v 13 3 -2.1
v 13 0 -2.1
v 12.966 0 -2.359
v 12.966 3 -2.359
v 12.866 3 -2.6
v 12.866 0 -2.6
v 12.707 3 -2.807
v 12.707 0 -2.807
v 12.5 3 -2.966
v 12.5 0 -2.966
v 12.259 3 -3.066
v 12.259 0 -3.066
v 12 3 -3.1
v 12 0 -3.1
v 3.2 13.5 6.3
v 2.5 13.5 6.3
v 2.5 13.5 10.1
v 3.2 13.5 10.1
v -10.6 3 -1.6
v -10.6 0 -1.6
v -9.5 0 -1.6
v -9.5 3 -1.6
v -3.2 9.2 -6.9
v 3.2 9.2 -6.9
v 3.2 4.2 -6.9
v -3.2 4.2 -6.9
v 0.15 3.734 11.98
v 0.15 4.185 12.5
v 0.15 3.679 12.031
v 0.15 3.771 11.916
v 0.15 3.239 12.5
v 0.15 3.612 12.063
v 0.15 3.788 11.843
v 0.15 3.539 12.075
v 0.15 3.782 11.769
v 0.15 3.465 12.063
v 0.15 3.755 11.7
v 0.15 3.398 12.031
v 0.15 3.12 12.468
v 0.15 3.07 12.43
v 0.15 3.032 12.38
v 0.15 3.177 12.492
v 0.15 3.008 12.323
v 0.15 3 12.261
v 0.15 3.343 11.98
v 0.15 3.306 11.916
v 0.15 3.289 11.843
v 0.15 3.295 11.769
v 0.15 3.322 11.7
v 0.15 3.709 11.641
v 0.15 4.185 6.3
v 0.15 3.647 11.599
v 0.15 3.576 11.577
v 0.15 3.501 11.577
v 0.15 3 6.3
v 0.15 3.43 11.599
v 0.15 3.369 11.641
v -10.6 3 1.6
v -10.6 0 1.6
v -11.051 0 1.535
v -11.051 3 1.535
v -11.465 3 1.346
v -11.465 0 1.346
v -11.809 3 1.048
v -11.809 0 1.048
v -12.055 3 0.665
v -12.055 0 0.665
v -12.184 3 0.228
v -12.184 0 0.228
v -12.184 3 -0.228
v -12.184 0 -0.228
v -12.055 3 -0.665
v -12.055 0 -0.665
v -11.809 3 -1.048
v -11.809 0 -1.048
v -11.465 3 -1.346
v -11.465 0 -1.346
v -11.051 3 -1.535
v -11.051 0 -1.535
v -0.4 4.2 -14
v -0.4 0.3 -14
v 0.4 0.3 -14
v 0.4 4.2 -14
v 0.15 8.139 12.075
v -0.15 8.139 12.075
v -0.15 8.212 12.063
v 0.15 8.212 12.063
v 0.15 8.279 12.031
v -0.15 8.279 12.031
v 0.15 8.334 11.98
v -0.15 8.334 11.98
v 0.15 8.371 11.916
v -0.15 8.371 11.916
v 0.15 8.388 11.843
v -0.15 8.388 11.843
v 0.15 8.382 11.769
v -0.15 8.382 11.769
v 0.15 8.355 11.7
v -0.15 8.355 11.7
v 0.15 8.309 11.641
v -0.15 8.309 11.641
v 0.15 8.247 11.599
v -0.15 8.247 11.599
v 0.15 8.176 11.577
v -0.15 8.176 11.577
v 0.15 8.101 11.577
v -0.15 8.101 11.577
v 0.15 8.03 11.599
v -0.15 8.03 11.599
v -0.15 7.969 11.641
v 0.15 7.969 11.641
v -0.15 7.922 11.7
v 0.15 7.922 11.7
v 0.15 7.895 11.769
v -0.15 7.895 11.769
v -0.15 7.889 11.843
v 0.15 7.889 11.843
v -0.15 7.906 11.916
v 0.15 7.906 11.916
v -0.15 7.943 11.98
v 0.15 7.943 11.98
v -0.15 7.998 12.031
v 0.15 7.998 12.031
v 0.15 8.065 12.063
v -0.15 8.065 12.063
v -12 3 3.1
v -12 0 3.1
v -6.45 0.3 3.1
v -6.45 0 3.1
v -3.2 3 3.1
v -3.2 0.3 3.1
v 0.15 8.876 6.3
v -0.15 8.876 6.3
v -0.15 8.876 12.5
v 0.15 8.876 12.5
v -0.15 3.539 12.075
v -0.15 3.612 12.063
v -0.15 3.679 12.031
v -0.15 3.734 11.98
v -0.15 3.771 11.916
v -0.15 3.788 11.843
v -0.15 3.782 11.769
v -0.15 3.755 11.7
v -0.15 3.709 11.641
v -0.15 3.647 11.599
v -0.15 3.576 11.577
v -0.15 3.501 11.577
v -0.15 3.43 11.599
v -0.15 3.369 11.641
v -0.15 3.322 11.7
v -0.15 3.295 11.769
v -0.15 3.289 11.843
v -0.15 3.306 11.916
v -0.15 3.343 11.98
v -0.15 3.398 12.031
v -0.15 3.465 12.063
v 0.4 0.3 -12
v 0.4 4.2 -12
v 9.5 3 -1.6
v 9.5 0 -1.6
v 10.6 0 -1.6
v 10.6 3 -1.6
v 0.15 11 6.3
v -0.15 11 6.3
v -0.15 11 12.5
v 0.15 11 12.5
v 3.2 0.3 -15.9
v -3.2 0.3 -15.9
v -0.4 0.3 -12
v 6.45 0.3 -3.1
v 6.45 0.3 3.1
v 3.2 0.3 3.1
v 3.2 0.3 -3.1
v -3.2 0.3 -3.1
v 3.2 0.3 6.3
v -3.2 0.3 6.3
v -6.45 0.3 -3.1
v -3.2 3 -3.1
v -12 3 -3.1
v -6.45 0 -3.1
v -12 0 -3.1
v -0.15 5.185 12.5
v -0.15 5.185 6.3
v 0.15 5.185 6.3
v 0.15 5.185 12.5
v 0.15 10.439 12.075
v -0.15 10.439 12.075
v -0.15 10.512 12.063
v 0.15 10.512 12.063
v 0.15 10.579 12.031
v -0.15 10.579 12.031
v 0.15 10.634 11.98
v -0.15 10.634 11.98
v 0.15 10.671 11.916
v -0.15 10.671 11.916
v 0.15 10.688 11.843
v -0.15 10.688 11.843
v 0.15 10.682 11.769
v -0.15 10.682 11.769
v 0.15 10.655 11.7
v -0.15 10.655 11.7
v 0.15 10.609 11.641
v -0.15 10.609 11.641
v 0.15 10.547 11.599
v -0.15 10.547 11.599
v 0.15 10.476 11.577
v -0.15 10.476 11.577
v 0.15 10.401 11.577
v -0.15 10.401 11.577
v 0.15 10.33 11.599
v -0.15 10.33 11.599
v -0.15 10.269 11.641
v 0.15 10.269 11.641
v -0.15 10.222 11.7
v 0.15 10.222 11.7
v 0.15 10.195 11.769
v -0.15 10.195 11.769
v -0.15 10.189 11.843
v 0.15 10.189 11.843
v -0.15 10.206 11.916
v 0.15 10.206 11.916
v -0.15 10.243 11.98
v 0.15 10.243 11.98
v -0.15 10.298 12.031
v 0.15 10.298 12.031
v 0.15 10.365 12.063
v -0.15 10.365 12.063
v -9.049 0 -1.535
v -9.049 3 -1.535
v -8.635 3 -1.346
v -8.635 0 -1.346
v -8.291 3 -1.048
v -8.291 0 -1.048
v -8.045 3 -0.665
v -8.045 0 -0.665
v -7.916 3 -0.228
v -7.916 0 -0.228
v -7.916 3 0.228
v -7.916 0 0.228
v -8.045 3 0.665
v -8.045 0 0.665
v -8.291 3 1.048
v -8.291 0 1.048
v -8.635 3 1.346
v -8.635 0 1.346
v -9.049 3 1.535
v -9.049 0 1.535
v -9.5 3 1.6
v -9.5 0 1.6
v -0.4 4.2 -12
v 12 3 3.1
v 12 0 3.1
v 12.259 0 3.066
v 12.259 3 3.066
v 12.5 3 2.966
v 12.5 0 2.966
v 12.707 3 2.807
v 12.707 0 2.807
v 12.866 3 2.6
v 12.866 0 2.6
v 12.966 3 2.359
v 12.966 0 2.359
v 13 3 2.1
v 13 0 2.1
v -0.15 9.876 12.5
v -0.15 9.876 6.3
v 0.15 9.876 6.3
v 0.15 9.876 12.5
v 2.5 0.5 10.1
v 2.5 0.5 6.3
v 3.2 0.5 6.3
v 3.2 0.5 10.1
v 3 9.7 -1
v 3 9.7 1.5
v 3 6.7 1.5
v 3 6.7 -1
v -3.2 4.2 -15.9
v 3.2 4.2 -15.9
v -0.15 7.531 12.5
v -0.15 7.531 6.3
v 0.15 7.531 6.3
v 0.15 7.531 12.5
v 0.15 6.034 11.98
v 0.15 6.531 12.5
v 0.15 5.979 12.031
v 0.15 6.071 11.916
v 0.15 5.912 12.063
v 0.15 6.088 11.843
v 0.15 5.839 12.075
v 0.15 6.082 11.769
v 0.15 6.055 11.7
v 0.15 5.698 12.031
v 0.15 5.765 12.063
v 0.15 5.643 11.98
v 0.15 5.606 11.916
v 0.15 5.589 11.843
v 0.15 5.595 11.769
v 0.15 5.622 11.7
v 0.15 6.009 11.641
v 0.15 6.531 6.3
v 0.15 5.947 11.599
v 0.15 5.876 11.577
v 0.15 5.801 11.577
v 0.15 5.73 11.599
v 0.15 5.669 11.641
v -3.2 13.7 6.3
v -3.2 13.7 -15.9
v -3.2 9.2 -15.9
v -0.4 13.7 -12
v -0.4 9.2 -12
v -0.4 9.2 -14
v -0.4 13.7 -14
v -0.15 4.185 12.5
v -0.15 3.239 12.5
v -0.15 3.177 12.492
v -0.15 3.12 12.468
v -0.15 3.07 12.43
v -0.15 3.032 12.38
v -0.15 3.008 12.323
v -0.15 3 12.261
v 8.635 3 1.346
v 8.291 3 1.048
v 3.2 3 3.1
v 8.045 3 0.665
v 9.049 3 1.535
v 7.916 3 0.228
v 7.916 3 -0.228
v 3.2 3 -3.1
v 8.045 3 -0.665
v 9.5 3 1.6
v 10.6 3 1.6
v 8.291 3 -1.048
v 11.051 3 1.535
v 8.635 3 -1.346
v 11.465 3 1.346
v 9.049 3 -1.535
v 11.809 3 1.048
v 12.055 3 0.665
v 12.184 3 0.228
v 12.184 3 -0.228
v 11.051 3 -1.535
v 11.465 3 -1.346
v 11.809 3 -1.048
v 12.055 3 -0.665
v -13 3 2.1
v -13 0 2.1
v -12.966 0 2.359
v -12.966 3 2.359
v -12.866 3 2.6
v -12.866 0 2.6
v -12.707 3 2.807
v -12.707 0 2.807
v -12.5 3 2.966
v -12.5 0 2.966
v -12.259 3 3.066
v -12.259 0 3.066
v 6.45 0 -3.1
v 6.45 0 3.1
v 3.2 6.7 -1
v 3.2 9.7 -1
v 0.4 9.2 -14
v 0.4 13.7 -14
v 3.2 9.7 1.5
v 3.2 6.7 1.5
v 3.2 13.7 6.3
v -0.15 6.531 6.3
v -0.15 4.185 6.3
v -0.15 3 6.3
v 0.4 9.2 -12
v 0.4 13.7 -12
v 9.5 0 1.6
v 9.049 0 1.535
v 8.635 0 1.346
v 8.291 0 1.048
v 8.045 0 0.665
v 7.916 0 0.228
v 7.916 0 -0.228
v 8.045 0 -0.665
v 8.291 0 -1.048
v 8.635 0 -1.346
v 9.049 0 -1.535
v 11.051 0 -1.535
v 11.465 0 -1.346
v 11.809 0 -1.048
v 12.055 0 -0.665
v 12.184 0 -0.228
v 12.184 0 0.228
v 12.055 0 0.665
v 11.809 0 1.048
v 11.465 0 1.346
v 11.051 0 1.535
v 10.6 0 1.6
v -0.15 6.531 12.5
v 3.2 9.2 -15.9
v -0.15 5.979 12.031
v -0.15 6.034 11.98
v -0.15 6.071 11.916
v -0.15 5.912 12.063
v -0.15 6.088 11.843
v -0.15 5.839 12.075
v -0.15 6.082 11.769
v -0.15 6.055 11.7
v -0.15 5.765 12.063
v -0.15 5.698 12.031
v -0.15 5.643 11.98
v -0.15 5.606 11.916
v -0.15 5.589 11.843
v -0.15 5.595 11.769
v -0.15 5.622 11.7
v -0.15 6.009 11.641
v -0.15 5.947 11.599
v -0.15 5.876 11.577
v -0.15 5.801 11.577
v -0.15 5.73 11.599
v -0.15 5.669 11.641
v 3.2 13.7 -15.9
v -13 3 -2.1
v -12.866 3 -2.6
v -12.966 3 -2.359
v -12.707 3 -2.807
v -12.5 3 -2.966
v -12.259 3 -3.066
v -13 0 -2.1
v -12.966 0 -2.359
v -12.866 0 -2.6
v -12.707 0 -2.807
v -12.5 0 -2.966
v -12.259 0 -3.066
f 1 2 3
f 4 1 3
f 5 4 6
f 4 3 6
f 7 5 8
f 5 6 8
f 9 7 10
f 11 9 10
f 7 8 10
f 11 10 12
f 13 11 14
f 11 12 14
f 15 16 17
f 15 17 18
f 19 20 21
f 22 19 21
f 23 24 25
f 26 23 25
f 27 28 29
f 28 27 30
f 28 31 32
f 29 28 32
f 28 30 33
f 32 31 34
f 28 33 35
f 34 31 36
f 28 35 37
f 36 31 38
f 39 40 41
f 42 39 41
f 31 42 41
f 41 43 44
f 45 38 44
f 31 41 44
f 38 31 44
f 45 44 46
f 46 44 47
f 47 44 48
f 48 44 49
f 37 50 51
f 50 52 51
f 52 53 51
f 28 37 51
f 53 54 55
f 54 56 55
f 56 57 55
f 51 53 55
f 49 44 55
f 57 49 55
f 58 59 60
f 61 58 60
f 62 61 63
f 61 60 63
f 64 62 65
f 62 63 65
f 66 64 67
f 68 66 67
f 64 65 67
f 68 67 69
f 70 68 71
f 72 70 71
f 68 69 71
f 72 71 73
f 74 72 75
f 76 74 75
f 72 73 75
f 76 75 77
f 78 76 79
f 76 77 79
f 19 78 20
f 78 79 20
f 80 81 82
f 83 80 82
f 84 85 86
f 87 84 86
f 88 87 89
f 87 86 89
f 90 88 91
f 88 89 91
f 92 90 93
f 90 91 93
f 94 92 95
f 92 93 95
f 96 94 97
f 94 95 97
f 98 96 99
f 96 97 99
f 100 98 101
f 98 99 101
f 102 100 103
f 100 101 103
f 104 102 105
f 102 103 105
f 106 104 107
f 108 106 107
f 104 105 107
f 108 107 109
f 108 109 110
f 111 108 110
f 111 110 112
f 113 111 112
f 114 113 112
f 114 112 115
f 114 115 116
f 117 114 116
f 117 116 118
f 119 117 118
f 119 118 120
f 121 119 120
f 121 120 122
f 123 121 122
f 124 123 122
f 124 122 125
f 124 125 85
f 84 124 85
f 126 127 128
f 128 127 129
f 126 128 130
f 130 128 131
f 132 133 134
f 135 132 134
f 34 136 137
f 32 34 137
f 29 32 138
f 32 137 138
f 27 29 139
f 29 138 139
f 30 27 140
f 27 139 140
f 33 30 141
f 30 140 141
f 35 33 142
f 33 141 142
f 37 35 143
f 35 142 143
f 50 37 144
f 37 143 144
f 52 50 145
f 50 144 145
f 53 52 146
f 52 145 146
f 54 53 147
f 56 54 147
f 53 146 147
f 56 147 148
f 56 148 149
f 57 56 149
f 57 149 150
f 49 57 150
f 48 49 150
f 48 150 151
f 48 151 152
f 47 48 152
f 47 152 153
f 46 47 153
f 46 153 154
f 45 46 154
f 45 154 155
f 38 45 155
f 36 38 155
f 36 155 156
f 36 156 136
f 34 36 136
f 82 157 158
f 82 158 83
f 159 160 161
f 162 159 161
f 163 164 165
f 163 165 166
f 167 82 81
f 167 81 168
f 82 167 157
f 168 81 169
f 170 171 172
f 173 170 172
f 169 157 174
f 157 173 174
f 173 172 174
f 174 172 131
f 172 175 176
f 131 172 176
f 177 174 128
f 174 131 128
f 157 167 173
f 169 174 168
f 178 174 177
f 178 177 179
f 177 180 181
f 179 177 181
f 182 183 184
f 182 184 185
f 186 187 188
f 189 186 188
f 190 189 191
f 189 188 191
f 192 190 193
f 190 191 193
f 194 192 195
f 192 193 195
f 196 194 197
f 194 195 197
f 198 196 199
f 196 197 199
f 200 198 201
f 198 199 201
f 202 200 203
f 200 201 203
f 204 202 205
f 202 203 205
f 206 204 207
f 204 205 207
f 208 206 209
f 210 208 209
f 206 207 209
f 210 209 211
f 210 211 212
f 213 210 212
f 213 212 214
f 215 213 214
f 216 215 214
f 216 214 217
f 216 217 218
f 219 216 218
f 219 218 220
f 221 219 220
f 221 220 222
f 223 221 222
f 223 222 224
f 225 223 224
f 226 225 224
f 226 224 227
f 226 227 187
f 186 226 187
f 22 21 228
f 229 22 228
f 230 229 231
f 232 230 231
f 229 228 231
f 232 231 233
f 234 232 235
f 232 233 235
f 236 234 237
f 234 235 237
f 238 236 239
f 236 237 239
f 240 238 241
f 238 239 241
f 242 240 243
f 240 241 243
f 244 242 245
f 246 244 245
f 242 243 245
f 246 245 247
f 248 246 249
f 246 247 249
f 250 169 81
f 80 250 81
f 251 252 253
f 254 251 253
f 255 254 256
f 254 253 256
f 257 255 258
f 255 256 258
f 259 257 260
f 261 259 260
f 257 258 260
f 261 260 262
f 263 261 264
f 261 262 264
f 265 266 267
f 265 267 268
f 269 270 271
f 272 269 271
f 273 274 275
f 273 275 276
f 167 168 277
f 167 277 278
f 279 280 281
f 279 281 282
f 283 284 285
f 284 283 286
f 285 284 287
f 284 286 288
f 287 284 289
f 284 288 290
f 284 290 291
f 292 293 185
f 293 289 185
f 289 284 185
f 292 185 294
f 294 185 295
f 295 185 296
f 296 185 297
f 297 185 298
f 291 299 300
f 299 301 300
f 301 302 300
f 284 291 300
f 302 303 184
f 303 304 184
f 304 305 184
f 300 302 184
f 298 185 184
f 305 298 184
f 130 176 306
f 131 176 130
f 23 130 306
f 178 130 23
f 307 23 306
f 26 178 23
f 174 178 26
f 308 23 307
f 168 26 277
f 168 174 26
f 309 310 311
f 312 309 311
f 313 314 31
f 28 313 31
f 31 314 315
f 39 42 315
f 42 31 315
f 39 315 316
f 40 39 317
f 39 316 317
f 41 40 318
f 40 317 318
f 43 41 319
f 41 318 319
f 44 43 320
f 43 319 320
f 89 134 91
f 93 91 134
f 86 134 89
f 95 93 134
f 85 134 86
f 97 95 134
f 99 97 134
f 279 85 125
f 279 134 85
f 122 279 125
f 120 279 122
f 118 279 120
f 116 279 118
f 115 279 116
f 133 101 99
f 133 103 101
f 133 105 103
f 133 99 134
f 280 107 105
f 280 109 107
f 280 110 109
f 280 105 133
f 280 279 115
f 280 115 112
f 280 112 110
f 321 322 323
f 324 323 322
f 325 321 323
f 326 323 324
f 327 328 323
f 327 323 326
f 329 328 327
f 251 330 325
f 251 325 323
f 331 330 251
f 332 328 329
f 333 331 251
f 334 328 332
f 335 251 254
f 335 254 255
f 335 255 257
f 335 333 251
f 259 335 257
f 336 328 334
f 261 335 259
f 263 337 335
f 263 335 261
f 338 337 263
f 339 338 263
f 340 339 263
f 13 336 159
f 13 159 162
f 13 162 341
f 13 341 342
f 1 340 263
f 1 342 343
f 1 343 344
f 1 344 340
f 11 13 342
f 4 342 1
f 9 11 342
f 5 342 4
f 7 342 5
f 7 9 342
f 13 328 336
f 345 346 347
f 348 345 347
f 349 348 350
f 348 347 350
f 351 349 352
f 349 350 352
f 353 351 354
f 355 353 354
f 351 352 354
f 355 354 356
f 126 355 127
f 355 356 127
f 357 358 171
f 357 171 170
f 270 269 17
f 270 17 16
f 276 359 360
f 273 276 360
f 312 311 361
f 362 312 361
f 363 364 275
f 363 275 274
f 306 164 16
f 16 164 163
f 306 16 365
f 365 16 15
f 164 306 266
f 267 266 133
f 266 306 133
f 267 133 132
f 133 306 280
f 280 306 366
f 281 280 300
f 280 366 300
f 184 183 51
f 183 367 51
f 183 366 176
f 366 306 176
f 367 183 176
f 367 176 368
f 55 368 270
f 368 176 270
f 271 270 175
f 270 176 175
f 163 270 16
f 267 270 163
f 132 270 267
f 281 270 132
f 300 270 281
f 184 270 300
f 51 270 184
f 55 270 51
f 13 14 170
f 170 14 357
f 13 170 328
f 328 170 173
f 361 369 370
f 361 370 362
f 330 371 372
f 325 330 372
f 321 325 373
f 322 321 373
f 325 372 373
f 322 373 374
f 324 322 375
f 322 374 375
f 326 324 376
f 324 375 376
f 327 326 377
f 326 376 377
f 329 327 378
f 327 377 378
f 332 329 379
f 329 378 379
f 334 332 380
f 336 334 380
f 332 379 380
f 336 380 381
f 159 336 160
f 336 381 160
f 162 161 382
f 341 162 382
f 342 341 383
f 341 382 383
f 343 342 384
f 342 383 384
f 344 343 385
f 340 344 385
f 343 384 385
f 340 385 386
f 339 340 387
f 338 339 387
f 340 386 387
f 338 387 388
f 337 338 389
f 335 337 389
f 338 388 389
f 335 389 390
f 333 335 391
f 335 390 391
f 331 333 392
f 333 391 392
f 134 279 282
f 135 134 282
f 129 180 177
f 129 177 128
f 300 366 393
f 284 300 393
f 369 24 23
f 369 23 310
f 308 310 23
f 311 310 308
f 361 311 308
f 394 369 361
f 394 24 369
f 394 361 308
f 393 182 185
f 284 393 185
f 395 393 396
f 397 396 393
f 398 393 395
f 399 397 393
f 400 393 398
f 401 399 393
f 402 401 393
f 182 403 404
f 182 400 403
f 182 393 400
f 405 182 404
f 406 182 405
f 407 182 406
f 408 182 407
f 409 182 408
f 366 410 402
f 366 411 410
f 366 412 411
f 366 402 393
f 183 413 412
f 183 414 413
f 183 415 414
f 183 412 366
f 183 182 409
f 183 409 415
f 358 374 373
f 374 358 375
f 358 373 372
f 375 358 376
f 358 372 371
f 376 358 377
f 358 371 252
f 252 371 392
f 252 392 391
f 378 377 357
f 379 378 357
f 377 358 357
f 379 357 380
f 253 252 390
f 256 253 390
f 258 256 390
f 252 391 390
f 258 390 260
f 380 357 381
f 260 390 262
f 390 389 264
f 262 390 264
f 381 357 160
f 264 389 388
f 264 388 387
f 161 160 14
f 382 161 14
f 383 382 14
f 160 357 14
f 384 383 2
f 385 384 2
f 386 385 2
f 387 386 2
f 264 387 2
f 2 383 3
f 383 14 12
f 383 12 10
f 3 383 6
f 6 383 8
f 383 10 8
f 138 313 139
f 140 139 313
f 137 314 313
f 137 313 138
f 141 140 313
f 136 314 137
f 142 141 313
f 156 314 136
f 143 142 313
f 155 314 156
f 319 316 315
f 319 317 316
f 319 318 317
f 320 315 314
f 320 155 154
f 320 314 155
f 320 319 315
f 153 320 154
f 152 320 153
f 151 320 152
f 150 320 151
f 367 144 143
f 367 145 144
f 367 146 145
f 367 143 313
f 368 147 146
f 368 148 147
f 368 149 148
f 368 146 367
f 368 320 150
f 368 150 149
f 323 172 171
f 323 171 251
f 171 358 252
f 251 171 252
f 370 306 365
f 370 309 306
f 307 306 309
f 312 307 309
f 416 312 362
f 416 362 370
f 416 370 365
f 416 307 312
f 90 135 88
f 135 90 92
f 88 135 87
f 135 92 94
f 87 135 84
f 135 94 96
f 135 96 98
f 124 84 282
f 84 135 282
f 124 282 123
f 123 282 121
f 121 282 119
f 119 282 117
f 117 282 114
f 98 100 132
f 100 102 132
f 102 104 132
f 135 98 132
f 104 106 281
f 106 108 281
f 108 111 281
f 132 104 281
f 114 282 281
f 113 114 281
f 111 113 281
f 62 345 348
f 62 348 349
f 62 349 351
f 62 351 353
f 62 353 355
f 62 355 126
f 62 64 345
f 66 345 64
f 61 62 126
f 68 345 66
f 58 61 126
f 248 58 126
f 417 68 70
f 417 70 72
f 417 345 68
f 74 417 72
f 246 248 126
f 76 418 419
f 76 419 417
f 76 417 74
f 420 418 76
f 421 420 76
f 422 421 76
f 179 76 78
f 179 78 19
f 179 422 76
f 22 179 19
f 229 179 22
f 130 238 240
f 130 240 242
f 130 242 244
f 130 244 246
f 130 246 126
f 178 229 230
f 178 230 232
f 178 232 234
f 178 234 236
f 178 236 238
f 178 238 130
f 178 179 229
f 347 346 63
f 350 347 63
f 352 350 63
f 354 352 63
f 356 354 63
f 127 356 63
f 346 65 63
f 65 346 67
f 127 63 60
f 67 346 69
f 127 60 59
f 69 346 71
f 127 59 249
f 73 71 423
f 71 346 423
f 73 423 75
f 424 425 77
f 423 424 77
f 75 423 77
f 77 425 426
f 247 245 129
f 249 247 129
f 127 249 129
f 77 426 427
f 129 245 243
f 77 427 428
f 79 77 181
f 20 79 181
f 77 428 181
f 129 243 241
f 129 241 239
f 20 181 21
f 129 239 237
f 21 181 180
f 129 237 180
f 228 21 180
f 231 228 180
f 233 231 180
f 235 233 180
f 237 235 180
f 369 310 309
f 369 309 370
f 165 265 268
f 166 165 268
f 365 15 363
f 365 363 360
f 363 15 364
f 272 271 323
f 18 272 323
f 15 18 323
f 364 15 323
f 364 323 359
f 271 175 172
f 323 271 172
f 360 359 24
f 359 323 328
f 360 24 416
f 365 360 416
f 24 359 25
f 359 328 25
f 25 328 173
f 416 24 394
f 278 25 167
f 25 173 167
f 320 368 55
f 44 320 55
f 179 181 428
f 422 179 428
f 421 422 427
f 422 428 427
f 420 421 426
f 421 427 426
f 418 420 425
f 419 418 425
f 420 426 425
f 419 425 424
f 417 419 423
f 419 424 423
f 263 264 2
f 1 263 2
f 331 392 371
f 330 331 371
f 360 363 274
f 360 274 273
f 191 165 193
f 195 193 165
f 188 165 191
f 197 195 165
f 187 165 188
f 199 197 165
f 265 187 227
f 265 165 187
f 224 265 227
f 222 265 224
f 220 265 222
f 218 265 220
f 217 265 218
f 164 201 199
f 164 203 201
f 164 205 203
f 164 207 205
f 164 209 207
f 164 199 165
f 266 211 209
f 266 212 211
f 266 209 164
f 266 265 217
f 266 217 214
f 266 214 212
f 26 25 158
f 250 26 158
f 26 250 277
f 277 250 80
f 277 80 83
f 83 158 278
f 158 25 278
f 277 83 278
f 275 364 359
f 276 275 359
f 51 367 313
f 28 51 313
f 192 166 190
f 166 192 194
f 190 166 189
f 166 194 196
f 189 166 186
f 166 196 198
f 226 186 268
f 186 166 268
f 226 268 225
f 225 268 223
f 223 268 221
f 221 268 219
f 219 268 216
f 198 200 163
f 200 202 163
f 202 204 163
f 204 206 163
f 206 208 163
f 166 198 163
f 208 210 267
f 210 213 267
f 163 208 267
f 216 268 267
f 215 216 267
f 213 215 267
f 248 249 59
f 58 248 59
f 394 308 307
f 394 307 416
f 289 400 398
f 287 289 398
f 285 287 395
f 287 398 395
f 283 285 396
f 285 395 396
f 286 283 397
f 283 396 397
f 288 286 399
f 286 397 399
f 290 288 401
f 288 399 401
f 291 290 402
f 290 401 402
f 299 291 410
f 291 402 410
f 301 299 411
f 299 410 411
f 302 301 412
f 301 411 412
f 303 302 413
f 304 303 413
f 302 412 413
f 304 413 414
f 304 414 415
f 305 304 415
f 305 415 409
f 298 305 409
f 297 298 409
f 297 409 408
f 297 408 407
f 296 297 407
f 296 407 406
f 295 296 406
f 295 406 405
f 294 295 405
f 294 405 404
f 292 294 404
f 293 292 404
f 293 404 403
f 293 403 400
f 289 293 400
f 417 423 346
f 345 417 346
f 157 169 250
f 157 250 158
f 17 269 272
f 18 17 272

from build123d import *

# Parameters (mm, degrees)
SKETCH1_W                = 6.4
SKETCH1_H                = 22.2
SKETCH1_W_2              = 0.8
SKETCH1_H_2              = 2
BOSS_EXTRUDE1_DEPTH      = 13.7
BOSS_EXTRUDE2_DEPTH      = 3
SKETCH2_W                = 9
SKETCH2_H                = 5
CUT_EXTRUDE1_DEPTH       = 27.513015672
SKETCH2_3_W              = 2.5
SKETCH2_3_H              = 3
CUT_EXTRUDE2_DEPTH       = 0.2
CUT_EXTRUDE3_DEPTH       = 0.3
BOSS_EXTRUDE3_DEPTH      = 6.5
BOSS_EXTRUDE3_DEPTH_BACK = 6.5
SKETCH4_W                = 0.7
SKETCH4_H                = 3.8
BOSS_EXTRUDE4_DEPTH      = 4
BOSS_EXTRUDE4_DEPTH_BACK = 4
SKETCH4_3_W              = 0.3
SKETCH4_3_H              = 6.2
SKETCH7_R                = 0.25
SKETCH7_W                = 6.2
SKETCH7_H                = 1
CUT_EXTRUDE4_DEPTH       = 1


with BuildPart() as part:
    # Sketch1 → Boss-Extrude1 (new body)
    with BuildSketch(Plane(origin=(0, 0, 0), x_dir=(1, 0, 0), z_dir=(0, 1, 0))):
        with Locations((0, 4.8)):
            Rectangle(SKETCH1_W, SKETCH1_H)
        with Locations((0, 13)):
            Rectangle(SKETCH1_W_2, SKETCH1_H_2, mode=Mode.SUBTRACT)
    extrude(amount=BOSS_EXTRUDE1_DEPTH)

    # Sketch1<4> → Boss-Extrude2 (add)
    # profile 1 of 2: a face of its own
    with BuildSketch(Plane(origin=(0, 0, 0), x_dir=(1, 0, 0), z_dir=(0, 1, 0))):
        with BuildLine():
            Line((-3.2, -3.1), (-3.2, 3.1))
            Line((-3.2, 3.1), (-12, 3.1))
            ThreePointArc((-12, 3.1), (-12.707106781, 2.807106781), (-13, 2.1))
            Line((-13, 2.1), (-13, -2.1))
            ThreePointArc((-13, -2.1), (-12.707106781, -2.807106781), (-12, -3.1))
            Line((-12, -3.1), (-3.2, -3.1))
        make_face()
        with BuildLine():
            ThreePointArc((-10.6, -1.6), (-12.2, 0), (-10.6, 1.6))
            Line((-10.6, 1.6), (-9.5, 1.6))
            ThreePointArc((-9.5, 1.6), (-7.9, 0), (-9.5, -1.6))
            Line((-9.5, -1.6), (-10.6, -1.6))
        make_face(mode=Mode.SUBTRACT)
    # profile 2 of 2: a face of its own
    with BuildSketch(Plane(origin=(0, 0, 0), x_dir=(1, 0, 0), z_dir=(0, 1, 0))):
        with BuildLine():
            Line((12, 3.1), (3.2, 3.1))
            Line((3.2, 3.1), (3.2, -3.1))
            Line((3.2, -3.1), (12, -3.1))
            ThreePointArc((12, -3.1), (12.707106781, -2.807106781), (13, -2.1))
            Line((13, -2.1), (13, 2.1))
            ThreePointArc((13, 2.1), (12.707106781, 2.807106781), (12, 3.1))
        make_face()
        with BuildLine():
            Line((9.5, 1.6), (10.6, 1.6))
            ThreePointArc((10.6, 1.6), (12.2, 0), (10.6, -1.6))
            Line((10.6, -1.6), (9.5, -1.6))
            ThreePointArc((9.5, -1.6), (7.9, 0), (9.5, 1.6))
        make_face(mode=Mode.SUBTRACT)
    extrude(amount=BOSS_EXTRUDE2_DEPTH)

    # Sketch2 → Cut-Extrude1 (cut, through all)
    with BuildSketch(Plane(origin=(3.2, 0, 0), x_dir=(0, 0, -1), z_dir=(1, 0, 0))):
        with Locations((11.4, 6.7)):
            Rectangle(SKETCH2_W, SKETCH2_H)
    extrude(amount=-CUT_EXTRUDE1_DEPTH, mode=Mode.SUBTRACT)

    # Sketch2<3> → Cut-Extrude2 (cut)
    with BuildSketch(Plane(origin=(3.2, 0, 0), x_dir=(0, 0, -1), z_dir=(1, 0, 0))):
        with Locations((-0.25, 8.2)):
            Rectangle(SKETCH2_3_W, SKETCH2_3_H)
    extrude(amount=-CUT_EXTRUDE2_DEPTH, mode=Mode.SUBTRACT)

    # Sketch3 → Cut-Extrude3 (cut)
    with BuildSketch(Plane.XZ):
        Polygon((-6.45, 3.1), (-3.2, 3.1), (-3.2, 6.3), (3.2, 6.3), (3.2, 3.1), (6.45, 3.1), (6.45, -3.1), (3.2, -3.1), (3.2, -15.9), (-3.2, -15.9), (-3.2, -3.1), (-6.45, -3.1), align=None)
    extrude(amount=-CUT_EXTRUDE3_DEPTH, mode=Mode.SUBTRACT)

    # Sketch4 → Boss-Extrude3 (add, two sides: drawn at the far end of the back side and taken through both)
    with BuildSketch(Plane(origin=(0, 7, 0), x_dir=(1, 0, 0), z_dir=(0, 1, 0)).offset(-BOSS_EXTRUDE3_DEPTH_BACK)):
        with Locations((2.85, -8.2)):
            Rectangle(SKETCH4_W, SKETCH4_H)
    extrude(amount=BOSS_EXTRUDE3_DEPTH + BOSS_EXTRUDE3_DEPTH_BACK)

    # Sketch4<3> → Boss-Extrude4 (add, two sides: drawn at the far end of the back side and taken through both)
    with BuildSketch(Plane(origin=(0, 7, 0), x_dir=(1, 0, 0), z_dir=(0, 1, 0)).offset(-BOSS_EXTRUDE4_DEPTH_BACK)):
        with Locations((0, -9.4)):
            Rectangle(SKETCH4_3_W, SKETCH4_3_H)
    extrude(amount=BOSS_EXTRUDE4_DEPTH + BOSS_EXTRUDE4_DEPTH_BACK)

    # Sketch7 → Cut-Extrude4 (cut)
    with BuildSketch(Plane.ZY.offset(0.15)):
        with Locations((11.824564477, 3.538657992)):
            Circle(SKETCH7_R)
        with Locations((11.824564477, 5.838657992)):
            Circle(SKETCH7_R)
        with Locations((11.824564477, 8.138657992)):
            Circle(SKETCH7_R)
        with Locations((11.824564477, 10.438657992)):
            Circle(SKETCH7_R)
        with BuildLine():
            Line((12.260846454, 3), (12.5, 3))
            Line((12.5, 3), (12.5, 3.239153546))
            ThreePointArc((12.5, 3.239153546), (12.429953548, 3.070046452), (12.260846454, 3))
        make_face()
        with Locations((9.4, 7.031126654)):
            Rectangle(SKETCH7_W, SKETCH7_H)
        with Locations((9.4, 9.376221563)):
            Rectangle(SKETCH7_W, SKETCH7_H)
        with Locations((9.4, 4.685096472)):
            Rectangle(SKETCH7_W, SKETCH7_H)
    extrude(amount=-CUT_EXTRUDE4_DEPTH, mode=Mode.SUBTRACT)


solid = part.part
